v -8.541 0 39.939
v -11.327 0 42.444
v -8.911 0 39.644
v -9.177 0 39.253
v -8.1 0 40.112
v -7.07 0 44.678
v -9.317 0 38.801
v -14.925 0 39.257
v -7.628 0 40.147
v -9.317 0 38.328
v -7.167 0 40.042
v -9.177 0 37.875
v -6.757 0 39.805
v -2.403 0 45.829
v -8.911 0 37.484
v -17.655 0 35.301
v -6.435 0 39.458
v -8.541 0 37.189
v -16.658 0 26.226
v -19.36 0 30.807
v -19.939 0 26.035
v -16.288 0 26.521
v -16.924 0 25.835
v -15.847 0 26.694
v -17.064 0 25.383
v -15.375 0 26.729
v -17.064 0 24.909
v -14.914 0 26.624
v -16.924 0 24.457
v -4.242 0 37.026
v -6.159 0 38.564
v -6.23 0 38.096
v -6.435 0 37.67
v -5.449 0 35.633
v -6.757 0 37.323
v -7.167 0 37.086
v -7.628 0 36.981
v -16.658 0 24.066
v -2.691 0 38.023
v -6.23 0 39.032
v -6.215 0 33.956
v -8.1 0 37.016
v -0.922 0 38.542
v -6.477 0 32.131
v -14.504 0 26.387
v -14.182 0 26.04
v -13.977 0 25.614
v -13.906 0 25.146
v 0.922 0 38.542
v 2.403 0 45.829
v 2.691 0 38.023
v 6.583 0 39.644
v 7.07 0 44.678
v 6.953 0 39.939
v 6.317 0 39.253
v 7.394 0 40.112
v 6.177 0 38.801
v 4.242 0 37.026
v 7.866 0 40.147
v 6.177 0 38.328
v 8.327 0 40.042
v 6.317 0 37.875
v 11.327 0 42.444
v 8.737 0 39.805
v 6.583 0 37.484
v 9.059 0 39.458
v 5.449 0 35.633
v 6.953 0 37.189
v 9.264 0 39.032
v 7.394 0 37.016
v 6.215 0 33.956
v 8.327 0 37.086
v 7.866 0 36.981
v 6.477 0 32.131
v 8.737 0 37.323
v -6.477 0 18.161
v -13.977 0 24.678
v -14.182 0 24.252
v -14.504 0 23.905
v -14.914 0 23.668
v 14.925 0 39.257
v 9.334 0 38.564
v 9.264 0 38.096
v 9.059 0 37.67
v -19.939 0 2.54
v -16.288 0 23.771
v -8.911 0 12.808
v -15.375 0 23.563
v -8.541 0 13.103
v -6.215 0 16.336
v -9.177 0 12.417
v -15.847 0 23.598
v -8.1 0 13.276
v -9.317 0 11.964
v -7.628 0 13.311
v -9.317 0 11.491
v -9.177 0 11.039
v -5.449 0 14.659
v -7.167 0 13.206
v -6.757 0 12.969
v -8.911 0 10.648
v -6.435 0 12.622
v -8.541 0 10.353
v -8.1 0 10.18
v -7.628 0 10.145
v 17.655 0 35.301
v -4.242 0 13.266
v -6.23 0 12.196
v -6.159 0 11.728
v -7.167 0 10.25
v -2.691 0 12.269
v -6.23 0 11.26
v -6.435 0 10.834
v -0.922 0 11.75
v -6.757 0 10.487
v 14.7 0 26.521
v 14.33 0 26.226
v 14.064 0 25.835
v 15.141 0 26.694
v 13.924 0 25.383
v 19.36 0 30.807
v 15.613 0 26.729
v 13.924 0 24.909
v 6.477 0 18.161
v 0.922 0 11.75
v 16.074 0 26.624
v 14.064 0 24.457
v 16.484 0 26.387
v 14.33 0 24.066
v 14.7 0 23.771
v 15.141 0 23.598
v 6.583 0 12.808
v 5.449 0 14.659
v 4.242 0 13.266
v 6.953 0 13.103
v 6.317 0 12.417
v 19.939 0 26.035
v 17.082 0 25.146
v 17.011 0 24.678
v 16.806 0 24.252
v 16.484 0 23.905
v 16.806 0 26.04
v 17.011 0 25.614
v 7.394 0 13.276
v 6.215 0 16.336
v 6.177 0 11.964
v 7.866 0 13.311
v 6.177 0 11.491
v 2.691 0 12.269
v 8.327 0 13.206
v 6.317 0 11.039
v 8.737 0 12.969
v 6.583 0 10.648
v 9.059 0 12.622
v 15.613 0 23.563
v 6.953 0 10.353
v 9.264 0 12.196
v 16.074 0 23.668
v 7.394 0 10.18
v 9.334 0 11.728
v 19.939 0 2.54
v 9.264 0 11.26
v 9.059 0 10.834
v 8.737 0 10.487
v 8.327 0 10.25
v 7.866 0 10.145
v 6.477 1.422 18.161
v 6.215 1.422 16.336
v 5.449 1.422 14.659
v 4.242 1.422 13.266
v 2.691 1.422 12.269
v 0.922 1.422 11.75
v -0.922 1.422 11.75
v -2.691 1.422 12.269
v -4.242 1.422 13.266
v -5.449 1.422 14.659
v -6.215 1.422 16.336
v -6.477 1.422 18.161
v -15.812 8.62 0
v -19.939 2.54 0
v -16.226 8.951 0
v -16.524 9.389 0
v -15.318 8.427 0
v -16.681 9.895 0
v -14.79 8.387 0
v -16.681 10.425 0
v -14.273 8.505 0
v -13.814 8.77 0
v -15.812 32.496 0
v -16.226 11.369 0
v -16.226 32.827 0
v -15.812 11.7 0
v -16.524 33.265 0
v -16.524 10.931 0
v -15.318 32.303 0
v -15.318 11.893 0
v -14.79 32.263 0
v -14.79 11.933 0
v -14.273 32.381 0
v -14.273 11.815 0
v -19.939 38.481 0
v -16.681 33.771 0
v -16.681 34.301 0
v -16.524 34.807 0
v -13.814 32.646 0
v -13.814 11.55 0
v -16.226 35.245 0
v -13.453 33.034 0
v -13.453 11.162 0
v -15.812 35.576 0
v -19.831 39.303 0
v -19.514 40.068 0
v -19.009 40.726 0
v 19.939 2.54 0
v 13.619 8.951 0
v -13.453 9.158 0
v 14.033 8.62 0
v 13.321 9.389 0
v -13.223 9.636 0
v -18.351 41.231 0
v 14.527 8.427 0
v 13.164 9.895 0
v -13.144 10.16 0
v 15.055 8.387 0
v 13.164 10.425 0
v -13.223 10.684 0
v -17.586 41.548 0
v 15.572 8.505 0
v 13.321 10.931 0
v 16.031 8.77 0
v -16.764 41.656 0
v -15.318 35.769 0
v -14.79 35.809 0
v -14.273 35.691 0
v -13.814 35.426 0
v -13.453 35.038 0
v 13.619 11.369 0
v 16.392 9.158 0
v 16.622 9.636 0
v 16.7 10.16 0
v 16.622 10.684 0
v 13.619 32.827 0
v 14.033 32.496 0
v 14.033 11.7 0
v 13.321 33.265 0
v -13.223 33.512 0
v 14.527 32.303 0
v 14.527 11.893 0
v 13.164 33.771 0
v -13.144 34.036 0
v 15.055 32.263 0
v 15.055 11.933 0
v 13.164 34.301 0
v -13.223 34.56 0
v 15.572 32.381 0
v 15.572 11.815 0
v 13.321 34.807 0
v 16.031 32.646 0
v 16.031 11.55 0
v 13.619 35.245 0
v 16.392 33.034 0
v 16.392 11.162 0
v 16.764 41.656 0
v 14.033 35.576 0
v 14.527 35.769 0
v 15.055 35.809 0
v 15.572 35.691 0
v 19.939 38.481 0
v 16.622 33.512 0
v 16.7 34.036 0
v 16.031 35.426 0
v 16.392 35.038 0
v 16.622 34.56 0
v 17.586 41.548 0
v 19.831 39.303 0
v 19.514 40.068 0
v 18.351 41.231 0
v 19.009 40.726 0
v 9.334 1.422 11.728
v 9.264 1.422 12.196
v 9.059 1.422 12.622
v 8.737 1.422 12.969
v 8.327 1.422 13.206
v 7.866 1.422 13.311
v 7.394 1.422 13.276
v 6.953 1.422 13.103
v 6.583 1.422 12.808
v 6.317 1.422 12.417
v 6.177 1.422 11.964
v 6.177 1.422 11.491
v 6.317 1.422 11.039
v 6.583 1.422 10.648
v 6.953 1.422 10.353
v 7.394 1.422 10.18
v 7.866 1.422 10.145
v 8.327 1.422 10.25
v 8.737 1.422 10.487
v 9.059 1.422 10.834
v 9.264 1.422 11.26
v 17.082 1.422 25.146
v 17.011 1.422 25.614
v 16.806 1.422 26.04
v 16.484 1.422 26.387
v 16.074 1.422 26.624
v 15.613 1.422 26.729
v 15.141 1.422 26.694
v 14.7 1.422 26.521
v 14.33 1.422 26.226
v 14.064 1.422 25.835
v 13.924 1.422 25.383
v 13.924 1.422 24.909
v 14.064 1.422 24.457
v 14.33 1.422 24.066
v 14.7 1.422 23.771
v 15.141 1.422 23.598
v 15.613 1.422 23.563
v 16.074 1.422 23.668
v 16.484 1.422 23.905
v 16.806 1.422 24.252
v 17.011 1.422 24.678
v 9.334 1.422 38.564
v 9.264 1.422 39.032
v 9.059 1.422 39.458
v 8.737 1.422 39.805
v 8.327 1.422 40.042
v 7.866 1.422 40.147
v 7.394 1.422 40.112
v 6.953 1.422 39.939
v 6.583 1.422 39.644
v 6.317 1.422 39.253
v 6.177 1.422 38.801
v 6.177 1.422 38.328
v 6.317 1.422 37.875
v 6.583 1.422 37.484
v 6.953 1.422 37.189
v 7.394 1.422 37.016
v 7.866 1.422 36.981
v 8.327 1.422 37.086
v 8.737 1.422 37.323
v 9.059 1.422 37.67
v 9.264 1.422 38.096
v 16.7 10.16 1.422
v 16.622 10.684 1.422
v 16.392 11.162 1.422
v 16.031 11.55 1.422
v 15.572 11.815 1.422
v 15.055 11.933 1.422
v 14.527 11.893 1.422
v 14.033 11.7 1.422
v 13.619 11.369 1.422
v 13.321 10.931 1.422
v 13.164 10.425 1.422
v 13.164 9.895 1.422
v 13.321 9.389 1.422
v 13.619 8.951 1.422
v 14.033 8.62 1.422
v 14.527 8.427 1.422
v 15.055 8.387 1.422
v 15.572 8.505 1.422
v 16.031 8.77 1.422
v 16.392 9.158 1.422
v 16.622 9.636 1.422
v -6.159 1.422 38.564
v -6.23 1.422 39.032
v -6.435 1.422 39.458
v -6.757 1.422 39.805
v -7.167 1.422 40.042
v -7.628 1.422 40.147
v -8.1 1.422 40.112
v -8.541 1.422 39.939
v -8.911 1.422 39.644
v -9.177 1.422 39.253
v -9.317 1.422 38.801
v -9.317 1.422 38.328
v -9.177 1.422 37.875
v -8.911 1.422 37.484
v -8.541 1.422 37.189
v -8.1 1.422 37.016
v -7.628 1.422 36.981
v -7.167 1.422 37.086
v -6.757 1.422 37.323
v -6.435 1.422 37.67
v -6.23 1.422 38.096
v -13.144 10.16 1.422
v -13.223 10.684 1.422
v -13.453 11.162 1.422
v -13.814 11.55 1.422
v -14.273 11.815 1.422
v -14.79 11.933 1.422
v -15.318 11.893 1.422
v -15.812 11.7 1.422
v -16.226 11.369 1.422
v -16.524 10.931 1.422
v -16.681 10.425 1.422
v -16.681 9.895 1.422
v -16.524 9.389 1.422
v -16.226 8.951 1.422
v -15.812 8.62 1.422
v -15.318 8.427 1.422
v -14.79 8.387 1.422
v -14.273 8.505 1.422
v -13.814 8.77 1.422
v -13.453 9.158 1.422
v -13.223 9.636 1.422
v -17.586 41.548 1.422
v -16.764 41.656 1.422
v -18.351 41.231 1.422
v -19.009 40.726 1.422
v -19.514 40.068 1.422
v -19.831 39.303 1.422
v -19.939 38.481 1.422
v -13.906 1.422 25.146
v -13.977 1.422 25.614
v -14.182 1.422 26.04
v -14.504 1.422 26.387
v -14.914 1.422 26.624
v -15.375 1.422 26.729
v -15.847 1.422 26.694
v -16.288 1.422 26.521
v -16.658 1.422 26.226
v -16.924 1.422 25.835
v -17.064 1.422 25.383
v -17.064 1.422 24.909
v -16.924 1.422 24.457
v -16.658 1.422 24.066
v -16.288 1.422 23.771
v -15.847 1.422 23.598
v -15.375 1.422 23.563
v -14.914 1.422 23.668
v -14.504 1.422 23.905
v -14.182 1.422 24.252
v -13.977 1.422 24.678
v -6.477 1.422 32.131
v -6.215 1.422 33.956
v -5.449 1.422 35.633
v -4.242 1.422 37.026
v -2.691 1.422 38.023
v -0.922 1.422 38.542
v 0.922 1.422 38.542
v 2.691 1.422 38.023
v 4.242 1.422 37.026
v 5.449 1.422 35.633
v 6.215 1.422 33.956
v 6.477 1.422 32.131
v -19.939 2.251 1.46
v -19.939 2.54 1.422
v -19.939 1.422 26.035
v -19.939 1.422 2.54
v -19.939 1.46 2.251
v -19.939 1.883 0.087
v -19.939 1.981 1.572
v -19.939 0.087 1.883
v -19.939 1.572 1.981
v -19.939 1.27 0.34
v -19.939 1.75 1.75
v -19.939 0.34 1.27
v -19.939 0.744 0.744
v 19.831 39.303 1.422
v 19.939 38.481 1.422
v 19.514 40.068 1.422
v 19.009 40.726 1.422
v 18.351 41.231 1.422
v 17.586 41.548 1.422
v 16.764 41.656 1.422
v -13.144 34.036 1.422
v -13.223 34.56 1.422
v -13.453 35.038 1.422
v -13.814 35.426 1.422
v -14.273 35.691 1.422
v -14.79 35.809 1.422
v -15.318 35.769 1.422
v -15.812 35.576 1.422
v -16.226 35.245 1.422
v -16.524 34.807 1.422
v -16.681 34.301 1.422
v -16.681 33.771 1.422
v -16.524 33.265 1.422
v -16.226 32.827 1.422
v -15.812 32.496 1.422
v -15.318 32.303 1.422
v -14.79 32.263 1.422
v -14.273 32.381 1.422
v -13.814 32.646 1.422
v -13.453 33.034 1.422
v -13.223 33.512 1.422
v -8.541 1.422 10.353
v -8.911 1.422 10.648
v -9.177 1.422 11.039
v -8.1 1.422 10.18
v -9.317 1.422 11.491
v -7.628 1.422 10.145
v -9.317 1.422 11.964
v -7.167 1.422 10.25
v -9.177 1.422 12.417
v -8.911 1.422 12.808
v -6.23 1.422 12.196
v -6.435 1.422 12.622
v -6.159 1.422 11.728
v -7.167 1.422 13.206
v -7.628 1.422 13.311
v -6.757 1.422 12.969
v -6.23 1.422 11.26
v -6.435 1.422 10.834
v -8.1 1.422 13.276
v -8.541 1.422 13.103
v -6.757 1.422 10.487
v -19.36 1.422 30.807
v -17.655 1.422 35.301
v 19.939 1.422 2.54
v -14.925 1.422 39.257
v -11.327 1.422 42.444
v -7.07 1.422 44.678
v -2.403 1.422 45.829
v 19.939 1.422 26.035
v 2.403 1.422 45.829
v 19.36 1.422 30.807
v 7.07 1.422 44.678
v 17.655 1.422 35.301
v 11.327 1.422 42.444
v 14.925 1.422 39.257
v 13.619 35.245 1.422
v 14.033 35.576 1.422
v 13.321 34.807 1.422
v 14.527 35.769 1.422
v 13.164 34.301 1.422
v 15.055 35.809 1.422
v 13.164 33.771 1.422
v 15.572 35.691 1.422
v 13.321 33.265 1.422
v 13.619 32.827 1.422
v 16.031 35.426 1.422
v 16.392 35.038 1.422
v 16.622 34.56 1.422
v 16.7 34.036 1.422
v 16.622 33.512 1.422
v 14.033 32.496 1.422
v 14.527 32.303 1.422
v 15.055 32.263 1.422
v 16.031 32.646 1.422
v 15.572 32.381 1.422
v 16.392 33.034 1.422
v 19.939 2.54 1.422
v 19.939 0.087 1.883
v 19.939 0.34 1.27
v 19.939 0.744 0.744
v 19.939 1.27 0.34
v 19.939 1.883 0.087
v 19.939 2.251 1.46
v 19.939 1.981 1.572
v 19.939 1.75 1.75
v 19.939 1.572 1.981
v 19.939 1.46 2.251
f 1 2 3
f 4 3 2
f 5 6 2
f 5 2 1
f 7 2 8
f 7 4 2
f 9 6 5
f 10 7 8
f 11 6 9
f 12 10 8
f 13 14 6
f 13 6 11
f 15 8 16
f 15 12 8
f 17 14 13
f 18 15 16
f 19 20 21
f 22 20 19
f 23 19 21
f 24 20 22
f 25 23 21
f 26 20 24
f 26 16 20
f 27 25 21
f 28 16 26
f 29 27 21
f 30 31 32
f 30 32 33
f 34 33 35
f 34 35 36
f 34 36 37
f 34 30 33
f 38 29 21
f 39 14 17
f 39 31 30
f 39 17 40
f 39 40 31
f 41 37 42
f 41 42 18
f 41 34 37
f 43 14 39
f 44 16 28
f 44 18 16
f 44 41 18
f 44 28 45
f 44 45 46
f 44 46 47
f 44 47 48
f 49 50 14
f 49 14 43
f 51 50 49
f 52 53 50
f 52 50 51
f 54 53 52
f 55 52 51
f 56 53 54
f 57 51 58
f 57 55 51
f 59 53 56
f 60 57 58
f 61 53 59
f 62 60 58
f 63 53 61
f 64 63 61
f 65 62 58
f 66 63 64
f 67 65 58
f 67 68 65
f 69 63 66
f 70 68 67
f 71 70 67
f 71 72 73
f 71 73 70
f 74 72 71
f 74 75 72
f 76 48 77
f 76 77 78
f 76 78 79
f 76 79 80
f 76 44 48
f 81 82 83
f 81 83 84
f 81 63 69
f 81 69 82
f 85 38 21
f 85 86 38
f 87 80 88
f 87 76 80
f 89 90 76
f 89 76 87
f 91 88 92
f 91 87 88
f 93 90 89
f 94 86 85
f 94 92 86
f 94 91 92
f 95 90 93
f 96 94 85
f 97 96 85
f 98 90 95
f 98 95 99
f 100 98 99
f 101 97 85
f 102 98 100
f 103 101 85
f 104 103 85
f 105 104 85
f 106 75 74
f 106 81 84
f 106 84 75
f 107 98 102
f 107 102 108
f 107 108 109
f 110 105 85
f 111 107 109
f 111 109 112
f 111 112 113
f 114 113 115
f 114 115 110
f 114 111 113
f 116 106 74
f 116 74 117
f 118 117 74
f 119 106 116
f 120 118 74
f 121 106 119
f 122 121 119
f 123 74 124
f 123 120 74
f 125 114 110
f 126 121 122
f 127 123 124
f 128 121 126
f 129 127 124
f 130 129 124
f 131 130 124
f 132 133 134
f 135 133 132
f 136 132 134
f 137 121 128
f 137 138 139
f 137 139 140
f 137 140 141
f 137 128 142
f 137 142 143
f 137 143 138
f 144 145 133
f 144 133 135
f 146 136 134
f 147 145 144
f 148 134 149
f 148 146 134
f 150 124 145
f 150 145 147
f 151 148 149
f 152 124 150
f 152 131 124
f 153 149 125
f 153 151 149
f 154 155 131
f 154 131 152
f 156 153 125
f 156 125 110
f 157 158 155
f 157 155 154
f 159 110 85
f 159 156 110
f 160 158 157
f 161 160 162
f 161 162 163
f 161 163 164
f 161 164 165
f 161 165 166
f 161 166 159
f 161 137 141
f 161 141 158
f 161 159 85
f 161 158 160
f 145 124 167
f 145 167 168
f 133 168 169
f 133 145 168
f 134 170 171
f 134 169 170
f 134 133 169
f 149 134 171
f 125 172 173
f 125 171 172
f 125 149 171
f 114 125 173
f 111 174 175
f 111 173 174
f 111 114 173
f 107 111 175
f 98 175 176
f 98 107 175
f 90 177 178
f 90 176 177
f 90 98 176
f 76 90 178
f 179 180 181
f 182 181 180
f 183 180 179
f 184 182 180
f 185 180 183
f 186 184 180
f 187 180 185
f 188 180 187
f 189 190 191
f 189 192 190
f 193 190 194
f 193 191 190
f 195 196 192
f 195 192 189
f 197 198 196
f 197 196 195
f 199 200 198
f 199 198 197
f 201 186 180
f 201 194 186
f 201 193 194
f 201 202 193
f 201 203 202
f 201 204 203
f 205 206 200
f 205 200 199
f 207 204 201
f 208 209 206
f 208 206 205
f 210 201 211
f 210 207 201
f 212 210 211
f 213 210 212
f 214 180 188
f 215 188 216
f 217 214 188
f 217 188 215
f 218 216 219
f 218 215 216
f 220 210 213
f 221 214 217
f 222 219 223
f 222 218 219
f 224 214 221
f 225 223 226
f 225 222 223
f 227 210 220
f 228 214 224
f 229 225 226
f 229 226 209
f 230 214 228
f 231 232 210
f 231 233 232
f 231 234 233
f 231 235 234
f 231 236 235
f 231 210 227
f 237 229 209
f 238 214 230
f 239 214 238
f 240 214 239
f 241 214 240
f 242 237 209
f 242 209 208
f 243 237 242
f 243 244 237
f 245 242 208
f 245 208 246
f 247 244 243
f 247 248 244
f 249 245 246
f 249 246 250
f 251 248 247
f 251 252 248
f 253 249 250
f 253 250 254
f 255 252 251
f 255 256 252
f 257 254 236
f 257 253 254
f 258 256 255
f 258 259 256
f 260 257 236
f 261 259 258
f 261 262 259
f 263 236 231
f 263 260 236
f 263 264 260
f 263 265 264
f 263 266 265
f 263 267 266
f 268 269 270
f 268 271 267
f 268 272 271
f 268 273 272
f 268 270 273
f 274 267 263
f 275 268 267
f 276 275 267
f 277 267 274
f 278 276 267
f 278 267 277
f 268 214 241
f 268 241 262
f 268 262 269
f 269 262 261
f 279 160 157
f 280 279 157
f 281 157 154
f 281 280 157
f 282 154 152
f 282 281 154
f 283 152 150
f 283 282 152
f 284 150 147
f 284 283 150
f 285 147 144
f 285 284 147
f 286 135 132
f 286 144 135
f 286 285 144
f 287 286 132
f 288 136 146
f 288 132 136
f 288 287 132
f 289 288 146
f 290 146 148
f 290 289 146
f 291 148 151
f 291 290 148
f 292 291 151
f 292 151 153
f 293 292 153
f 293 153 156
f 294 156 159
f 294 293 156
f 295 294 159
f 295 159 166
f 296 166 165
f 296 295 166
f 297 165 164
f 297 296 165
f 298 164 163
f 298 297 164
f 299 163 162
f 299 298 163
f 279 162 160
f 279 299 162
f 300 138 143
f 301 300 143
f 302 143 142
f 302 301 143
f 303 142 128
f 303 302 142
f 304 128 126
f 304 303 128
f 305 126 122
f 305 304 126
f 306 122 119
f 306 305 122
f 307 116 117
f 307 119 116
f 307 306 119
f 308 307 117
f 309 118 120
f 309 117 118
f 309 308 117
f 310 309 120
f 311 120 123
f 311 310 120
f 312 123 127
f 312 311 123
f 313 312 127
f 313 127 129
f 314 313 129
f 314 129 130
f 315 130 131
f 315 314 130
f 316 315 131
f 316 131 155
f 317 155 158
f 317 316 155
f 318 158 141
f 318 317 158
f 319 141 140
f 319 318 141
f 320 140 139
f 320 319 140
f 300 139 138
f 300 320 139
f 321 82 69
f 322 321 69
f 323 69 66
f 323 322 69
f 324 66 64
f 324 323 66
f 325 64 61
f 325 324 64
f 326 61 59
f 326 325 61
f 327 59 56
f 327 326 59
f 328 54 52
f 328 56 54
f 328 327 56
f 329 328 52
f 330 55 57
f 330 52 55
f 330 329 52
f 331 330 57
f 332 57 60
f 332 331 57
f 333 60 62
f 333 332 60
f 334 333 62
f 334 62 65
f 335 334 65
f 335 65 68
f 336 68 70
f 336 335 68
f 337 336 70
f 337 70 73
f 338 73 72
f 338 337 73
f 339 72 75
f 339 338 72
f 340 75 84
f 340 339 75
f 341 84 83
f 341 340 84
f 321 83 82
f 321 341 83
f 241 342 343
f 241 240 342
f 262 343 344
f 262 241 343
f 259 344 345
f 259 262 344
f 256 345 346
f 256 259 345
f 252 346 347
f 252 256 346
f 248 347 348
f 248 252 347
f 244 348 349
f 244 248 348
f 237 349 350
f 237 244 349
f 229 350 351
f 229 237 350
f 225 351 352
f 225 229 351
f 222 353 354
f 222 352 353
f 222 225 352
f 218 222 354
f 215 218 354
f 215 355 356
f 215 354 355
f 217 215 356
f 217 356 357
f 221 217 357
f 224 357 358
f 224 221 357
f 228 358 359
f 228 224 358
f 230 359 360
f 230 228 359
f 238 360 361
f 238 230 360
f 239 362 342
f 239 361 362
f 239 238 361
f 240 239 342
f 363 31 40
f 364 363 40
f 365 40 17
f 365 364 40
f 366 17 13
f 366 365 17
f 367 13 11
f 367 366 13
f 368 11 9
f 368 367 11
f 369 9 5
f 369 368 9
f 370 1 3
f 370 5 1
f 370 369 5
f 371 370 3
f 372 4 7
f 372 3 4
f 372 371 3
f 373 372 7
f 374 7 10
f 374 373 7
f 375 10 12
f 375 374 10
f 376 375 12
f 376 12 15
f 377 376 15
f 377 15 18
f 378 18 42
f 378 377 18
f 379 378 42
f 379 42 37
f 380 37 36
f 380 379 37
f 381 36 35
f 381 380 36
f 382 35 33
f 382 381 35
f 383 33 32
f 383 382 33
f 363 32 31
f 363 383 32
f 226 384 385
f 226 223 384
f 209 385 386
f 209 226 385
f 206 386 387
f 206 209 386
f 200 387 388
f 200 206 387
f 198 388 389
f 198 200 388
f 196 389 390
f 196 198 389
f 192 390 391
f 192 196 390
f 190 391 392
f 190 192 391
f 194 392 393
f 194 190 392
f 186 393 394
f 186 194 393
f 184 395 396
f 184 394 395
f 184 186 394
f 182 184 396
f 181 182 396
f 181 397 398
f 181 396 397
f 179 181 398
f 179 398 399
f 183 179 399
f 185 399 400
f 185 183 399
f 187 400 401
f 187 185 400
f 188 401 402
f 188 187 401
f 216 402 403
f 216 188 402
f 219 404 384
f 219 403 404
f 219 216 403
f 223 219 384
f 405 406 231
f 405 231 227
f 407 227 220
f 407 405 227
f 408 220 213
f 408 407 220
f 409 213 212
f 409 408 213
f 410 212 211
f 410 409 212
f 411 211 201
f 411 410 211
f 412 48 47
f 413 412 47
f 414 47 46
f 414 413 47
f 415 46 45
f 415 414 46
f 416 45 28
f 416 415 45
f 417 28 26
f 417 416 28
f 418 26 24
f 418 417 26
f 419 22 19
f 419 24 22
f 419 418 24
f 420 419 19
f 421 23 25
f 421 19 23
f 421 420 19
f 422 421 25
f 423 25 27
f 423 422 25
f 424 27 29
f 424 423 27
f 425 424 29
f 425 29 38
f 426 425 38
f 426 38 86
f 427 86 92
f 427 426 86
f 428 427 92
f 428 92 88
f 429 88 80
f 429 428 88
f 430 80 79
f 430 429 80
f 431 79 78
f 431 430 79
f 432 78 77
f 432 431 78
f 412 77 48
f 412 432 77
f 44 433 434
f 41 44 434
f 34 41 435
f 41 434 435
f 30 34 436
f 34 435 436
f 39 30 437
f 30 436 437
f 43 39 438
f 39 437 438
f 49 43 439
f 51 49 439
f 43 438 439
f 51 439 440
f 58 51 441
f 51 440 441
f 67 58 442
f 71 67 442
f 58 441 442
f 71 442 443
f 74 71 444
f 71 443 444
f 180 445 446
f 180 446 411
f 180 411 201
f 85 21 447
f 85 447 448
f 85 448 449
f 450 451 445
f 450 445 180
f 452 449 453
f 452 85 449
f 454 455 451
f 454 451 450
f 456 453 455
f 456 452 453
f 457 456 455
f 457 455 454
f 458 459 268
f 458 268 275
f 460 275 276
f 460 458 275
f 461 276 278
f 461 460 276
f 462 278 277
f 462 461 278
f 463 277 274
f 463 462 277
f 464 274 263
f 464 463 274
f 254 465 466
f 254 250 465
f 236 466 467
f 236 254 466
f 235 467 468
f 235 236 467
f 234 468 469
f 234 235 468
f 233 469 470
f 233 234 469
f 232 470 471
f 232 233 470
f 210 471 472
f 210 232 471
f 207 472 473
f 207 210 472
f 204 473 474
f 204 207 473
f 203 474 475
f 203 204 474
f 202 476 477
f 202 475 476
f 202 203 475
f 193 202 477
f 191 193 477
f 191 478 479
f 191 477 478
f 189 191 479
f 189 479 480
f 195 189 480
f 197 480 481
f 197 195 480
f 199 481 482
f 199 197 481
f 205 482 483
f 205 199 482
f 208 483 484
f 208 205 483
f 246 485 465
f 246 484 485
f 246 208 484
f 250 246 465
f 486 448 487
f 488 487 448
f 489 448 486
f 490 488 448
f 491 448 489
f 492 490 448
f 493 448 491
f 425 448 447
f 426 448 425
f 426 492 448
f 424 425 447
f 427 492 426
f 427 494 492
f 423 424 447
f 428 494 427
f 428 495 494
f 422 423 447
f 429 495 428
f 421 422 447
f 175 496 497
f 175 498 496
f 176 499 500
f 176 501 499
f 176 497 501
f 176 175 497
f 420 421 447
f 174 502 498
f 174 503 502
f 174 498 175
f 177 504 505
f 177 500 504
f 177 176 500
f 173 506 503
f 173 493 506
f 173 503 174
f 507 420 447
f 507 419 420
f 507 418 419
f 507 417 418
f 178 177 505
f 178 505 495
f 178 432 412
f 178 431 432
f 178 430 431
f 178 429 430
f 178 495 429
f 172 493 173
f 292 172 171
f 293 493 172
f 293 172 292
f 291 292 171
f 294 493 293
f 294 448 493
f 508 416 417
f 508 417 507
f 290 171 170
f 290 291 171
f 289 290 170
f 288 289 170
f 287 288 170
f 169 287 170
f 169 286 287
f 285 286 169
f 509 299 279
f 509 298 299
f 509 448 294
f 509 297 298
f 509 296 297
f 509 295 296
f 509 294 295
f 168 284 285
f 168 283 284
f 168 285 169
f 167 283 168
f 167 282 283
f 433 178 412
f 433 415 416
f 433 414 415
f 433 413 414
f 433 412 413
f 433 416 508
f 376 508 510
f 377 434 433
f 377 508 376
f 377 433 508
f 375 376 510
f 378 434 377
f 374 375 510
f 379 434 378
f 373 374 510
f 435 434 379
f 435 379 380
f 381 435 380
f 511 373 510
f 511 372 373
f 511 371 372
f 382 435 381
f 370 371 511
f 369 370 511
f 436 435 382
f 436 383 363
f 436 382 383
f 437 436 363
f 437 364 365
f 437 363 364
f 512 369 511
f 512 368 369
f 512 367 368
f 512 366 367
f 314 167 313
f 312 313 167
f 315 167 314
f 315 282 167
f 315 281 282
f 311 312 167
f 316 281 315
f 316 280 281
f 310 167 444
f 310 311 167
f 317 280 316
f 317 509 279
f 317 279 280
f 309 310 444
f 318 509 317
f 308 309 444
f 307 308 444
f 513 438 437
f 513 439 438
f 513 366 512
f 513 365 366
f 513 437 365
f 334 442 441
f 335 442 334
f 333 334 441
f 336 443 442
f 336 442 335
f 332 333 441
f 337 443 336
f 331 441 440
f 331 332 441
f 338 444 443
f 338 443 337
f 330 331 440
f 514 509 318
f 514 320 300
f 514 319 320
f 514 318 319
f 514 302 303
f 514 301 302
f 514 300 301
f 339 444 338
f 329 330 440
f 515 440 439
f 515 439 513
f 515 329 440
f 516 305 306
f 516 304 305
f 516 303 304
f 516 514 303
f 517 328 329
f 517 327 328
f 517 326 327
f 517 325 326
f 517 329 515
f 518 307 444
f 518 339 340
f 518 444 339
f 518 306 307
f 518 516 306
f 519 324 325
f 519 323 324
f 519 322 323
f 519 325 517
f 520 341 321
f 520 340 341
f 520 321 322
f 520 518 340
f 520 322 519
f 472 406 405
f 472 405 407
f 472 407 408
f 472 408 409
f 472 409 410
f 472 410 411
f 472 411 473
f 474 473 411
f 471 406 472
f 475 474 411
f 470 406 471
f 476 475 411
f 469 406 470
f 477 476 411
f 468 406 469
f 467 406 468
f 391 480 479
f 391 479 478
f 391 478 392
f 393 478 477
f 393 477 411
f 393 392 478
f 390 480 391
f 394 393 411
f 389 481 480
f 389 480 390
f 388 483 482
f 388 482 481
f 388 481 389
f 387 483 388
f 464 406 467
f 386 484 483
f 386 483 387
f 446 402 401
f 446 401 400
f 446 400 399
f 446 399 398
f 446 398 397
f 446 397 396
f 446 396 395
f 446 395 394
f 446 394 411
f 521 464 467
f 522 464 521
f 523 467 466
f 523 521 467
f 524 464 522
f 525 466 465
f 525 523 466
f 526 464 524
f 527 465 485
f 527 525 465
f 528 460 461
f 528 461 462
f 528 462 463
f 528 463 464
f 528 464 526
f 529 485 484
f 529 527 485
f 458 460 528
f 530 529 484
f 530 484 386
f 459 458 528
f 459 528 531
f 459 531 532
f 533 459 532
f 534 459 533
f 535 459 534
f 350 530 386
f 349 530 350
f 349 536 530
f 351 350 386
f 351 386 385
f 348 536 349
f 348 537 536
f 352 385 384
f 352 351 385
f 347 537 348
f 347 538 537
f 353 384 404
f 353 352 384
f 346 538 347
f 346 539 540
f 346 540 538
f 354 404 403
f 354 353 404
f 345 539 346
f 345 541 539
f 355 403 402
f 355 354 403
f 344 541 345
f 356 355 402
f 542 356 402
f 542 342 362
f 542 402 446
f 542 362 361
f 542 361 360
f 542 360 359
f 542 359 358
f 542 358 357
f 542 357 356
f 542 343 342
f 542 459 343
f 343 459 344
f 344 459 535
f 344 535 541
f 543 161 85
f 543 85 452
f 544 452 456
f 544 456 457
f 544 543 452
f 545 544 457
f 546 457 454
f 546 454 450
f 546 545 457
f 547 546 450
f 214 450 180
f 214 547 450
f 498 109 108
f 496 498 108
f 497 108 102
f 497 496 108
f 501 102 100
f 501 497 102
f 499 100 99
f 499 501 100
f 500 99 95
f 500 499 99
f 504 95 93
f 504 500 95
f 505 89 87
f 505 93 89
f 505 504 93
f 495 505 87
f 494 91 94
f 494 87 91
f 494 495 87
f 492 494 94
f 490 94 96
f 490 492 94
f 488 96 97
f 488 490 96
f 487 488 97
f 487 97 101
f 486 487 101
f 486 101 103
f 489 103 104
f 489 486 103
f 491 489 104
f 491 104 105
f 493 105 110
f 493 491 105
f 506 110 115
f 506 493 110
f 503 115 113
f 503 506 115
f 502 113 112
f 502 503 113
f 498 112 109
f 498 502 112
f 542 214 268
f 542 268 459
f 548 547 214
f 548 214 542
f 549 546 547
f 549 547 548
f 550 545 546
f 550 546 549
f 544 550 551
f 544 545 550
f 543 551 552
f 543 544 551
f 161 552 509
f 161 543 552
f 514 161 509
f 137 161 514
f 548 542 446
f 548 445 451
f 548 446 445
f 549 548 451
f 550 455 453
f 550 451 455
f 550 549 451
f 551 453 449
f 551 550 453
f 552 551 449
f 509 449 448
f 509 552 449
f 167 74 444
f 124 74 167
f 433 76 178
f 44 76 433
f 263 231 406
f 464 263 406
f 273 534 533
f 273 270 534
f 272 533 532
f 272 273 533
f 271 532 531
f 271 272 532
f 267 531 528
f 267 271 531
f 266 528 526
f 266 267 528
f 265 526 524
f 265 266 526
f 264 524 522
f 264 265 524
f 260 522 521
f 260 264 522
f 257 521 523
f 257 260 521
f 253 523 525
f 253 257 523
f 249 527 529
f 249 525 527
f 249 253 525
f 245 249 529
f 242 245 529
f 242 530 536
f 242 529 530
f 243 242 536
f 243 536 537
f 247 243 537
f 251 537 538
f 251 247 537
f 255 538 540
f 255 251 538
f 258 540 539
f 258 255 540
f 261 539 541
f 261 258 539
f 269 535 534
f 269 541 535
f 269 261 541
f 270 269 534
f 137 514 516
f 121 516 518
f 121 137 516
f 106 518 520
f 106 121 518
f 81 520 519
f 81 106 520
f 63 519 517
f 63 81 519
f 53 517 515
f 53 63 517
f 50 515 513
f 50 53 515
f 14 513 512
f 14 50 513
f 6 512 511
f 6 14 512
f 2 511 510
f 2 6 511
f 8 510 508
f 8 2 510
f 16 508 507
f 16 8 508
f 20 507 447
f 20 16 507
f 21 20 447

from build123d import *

# Parameters (mm, degrees)
F1_DEPTH = 1270
F2_R     = 1.5875
F3_DEPTH = 1270
F4_R     = 1.778
F5_DEPTH = 1270


with BuildPart() as f1:
    # F0 (on Right) → F1 (new body, symmetric)
    with BuildSketch(Plane.YZ):
        with BuildLine():
            Line((1.4224, 45.974), (0, 45.974))
            Line((0, 45.974), (0, 2.54))
            ThreePointArc((0, 2.54), (0.743949, 0.743949), (2.54, 0))
            Line((2.54, 0), (41.656, 0))
            Line((41.656, 0), (41.656, 1.4224))
            Line((41.656, 1.4224), (2.54, 1.4224))
            ThreePointArc((2.54, 1.4224), (1.749737, 1.749737), (1.4224, 2.54))
            Line((1.4224, 2.54), (1.4224, 45.974))
        make_face()
    extrude(amount=F1_DEPTH, both=True)

    # F2 (on Front) → F3 (intersect, symmetric)
    with BuildSketch(Plane.XZ):
        with BuildLine():
            ThreePointArc((19.939, 26.035), (0, 45.974), (-19.939, 26.035))
            Line((-19.939, 26.035), (-19.939, 0))
            Line((-19.939, 0), (19.939, 0))
            Line((19.939, 0), (19.939, 26.035))
        make_face()
        with Locations((-7.747, 11.727802)):
            Circle(F2_R, mode=Mode.SUBTRACT)
        with Locations((7.747, 11.727802)):
            Circle(F2_R, mode=Mode.SUBTRACT)
        with Locations((-15.494, 25.146)):
            Circle(F2_R, mode=Mode.SUBTRACT)
        with Locations((-7.747, 38.564198)):
            Circle(F2_R, mode=Mode.SUBTRACT)
        with BuildLine():
            Line((-6.477, 18.161), (-6.477, 32.131))
            ThreePointArc((-6.477, 32.131), (0, 38.608), (6.477, 32.131))
            Line((6.477, 32.131), (6.477, 18.161))
            ThreePointArc((6.477, 18.161), (0, 11.684), (-6.477, 18.161))
        make_face(mode=Mode.SUBTRACT)
        with Locations((15.494, 25.146)):
            Circle(F2_R, mode=Mode.SUBTRACT)
        with Locations((7.747, 38.564198)):
            Circle(F2_R, mode=Mode.SUBTRACT)
    extrude(amount=F3_DEPTH, both=True, mode=Mode.INTERSECT)

    # F4 (on Top) → F5 (intersect, symmetric)
    with BuildSketch(Plane.XY):
        with BuildLine():
            Line((-19.939, 38.481), (-19.939, 0))
            Line((-19.939, 0), (19.939, 0))
            Line((19.939, 0), (19.939, 38.481))
            ThreePointArc((19.939, 38.481), (19.009064, 40.726064), (16.764, 41.656))
            Line((16.764, 41.656), (-16.764, 41.656))
            ThreePointArc((-16.764, 41.656), (-19.009064, 40.726064), (-19.939, 38.481))
        make_face()
        with Locations((-14.9225, 10.16)):
            Circle(F4_R, mode=Mode.SUBTRACT)
        with Locations((14.9225, 10.16)):
            Circle(F4_R, mode=Mode.SUBTRACT)
        with Locations((-14.9225, 34.036)):
            Circle(F4_R, mode=Mode.SUBTRACT)
        with Locations((14.9225, 34.036)):
            Circle(F4_R, mode=Mode.SUBTRACT)
    extrude(amount=F5_DEPTH, both=True, mode=Mode.INTERSECT)


solid = f1.part
